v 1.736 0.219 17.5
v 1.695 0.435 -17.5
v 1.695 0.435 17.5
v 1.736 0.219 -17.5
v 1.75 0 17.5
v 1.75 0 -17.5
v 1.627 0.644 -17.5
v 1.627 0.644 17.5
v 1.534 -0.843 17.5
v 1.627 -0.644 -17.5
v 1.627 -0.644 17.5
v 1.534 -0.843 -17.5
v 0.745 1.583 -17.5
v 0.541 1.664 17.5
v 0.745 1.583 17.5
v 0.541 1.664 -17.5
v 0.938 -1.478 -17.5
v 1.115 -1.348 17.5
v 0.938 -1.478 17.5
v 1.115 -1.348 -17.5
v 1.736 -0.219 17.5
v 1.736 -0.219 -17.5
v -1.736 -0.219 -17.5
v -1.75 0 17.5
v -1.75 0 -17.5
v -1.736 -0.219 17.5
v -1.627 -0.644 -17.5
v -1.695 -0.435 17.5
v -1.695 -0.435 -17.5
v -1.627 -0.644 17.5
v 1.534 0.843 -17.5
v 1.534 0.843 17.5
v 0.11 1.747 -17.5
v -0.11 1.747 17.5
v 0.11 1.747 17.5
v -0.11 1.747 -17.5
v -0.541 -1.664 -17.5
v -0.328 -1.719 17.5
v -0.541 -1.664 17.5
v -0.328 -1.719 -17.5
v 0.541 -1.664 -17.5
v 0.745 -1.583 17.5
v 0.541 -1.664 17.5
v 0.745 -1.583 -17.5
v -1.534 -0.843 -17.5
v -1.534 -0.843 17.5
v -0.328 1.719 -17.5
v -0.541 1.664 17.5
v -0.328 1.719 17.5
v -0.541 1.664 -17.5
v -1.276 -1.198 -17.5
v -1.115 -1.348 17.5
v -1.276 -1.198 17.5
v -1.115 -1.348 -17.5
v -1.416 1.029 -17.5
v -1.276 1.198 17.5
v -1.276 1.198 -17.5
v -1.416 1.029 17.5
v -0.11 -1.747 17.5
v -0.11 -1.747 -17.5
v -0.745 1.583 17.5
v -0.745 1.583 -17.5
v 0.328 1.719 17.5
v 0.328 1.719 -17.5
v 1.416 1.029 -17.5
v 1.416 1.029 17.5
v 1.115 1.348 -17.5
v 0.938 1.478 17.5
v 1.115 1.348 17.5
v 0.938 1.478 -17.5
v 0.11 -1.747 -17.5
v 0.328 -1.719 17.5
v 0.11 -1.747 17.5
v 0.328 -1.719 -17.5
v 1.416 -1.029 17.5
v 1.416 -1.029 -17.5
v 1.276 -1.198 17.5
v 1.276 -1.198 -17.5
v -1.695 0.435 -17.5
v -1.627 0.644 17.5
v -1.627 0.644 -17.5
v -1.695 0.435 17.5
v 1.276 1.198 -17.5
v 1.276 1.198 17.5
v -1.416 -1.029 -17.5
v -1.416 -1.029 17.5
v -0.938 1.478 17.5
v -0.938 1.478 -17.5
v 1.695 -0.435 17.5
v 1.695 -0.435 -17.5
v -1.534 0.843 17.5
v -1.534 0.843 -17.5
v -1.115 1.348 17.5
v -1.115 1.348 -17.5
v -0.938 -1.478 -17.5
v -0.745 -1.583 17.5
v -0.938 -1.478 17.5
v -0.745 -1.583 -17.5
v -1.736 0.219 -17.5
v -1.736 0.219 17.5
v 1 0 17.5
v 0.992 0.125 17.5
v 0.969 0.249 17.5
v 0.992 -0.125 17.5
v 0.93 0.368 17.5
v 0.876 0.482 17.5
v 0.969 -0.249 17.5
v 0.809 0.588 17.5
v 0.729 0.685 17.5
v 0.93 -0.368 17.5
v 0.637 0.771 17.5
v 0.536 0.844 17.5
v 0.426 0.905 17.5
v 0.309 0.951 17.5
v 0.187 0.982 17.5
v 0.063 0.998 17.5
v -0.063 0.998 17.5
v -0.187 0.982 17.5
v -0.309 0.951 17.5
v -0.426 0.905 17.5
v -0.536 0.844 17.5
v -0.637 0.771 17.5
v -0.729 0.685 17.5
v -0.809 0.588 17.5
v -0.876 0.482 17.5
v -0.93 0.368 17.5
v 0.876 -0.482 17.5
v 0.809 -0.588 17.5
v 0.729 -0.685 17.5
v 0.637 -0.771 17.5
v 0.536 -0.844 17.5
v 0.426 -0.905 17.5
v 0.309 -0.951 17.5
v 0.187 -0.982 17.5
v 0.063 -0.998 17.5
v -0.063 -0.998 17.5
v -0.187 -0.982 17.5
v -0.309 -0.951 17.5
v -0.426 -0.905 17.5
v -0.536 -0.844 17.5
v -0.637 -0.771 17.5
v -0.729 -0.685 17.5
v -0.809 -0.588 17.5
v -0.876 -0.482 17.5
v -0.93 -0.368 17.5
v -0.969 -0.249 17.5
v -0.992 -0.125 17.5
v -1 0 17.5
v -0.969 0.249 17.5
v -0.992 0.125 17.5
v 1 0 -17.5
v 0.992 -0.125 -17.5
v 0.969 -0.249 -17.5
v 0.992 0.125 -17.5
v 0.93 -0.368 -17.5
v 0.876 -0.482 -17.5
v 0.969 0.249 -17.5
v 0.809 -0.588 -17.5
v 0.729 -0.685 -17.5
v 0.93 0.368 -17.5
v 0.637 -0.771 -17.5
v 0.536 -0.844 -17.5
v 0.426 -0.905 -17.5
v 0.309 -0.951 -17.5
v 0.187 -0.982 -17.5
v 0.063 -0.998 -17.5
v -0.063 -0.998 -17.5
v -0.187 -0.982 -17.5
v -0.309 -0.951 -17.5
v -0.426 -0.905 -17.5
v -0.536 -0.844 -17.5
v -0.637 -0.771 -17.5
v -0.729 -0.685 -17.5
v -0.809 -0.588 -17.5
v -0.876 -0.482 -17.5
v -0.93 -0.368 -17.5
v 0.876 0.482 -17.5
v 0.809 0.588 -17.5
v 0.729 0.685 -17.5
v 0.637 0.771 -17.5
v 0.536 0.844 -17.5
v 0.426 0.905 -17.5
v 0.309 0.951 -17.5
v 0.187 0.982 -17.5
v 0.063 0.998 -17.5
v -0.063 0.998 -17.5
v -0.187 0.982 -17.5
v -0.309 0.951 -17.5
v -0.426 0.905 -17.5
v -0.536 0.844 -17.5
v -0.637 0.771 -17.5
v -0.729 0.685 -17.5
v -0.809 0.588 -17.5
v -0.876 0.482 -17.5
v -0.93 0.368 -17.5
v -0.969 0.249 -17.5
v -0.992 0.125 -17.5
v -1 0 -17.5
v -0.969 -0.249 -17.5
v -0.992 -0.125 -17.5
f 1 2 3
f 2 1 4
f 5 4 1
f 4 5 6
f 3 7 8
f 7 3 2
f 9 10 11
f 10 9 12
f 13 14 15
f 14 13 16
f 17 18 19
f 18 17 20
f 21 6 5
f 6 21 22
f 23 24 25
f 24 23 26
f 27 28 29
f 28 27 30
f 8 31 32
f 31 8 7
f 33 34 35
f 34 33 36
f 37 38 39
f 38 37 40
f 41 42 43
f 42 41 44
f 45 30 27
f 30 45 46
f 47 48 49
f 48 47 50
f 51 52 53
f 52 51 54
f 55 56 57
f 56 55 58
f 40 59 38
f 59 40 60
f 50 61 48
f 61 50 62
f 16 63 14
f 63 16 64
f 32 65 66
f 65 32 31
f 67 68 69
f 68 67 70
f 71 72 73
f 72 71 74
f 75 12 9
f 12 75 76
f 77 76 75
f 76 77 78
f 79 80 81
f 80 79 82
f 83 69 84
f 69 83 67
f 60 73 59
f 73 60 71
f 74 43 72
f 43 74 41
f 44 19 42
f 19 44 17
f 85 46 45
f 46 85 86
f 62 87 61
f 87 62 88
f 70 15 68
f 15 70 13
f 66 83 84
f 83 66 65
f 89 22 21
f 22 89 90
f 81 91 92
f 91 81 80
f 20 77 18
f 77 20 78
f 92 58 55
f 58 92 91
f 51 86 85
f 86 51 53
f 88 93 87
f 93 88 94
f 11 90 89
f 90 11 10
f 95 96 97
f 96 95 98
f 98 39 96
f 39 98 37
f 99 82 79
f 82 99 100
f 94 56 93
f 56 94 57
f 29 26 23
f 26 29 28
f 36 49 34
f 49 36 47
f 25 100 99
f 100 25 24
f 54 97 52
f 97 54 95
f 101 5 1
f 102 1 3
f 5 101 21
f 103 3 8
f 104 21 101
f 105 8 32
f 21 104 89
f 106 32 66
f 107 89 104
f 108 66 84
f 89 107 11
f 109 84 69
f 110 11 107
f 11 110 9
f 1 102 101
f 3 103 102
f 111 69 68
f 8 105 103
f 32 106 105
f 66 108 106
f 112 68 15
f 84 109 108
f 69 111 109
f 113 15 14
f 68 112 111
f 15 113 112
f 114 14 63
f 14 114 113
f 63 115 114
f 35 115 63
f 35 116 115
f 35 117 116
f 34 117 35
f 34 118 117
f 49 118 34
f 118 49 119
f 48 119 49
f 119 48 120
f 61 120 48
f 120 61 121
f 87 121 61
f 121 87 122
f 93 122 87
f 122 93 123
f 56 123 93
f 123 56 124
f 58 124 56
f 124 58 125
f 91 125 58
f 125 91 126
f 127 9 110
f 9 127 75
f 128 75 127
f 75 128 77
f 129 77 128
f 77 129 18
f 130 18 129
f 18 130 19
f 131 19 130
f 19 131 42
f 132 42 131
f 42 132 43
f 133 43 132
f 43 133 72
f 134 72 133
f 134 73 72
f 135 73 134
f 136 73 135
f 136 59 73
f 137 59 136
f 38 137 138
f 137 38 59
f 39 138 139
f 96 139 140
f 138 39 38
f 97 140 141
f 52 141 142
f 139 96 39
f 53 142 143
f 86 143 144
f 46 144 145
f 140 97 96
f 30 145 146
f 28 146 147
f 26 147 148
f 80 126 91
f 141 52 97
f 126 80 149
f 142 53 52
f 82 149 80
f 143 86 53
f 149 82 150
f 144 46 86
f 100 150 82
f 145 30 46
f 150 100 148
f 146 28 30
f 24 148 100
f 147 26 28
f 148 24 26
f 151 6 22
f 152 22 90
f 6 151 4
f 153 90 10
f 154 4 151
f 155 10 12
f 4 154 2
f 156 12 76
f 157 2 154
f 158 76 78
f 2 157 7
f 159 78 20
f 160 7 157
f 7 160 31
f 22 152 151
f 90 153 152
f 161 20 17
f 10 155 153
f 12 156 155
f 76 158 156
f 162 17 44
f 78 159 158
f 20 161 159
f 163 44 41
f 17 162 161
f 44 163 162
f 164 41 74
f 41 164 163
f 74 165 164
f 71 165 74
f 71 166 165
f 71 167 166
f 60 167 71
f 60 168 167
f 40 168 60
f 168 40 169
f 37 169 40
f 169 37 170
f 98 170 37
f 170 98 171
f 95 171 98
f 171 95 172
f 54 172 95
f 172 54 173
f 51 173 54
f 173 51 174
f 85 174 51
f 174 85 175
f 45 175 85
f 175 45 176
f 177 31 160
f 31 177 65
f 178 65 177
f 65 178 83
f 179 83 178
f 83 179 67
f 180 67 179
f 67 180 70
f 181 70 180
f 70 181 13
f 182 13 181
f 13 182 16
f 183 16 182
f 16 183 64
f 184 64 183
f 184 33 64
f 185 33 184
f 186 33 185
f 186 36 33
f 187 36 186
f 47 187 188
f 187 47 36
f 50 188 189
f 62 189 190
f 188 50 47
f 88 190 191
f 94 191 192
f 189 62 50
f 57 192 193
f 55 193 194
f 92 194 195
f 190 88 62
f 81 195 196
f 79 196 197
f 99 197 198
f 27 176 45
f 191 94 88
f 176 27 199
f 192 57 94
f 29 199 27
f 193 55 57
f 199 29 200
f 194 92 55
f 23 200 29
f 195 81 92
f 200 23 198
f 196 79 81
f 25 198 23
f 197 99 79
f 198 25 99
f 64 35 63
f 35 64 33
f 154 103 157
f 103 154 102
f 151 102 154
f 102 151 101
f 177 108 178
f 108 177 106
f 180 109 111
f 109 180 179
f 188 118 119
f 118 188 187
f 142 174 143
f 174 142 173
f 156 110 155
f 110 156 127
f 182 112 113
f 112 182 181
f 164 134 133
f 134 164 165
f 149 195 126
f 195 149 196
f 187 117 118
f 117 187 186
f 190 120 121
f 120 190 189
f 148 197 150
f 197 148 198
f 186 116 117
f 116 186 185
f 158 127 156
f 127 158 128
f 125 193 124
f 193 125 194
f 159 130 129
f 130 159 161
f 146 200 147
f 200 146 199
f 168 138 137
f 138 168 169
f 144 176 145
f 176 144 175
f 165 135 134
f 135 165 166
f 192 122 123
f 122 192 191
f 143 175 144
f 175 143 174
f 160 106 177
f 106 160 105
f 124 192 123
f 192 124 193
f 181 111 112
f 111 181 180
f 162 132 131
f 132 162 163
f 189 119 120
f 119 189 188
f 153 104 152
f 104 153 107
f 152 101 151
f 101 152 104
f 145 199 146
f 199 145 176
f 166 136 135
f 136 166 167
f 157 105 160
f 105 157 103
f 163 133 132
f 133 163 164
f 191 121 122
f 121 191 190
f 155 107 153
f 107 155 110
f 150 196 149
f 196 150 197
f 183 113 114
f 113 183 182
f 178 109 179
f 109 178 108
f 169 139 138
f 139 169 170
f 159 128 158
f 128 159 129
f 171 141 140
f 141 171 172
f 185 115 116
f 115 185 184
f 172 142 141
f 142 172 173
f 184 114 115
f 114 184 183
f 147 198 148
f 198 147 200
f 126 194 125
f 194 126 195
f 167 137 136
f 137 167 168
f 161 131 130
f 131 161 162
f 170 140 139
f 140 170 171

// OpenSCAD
$fn = 50;


difference() {
	union() {
		translate(v = [0, 0, -17.5000000000]) {
			cylinder(h = 35, r = 1.7500000000);
		}
	}
	union() {
		translate(v = [0, 0, -100.0000000000]) {
			cylinder(h = 200, r = 1.0000000000);
		}
	}
}
